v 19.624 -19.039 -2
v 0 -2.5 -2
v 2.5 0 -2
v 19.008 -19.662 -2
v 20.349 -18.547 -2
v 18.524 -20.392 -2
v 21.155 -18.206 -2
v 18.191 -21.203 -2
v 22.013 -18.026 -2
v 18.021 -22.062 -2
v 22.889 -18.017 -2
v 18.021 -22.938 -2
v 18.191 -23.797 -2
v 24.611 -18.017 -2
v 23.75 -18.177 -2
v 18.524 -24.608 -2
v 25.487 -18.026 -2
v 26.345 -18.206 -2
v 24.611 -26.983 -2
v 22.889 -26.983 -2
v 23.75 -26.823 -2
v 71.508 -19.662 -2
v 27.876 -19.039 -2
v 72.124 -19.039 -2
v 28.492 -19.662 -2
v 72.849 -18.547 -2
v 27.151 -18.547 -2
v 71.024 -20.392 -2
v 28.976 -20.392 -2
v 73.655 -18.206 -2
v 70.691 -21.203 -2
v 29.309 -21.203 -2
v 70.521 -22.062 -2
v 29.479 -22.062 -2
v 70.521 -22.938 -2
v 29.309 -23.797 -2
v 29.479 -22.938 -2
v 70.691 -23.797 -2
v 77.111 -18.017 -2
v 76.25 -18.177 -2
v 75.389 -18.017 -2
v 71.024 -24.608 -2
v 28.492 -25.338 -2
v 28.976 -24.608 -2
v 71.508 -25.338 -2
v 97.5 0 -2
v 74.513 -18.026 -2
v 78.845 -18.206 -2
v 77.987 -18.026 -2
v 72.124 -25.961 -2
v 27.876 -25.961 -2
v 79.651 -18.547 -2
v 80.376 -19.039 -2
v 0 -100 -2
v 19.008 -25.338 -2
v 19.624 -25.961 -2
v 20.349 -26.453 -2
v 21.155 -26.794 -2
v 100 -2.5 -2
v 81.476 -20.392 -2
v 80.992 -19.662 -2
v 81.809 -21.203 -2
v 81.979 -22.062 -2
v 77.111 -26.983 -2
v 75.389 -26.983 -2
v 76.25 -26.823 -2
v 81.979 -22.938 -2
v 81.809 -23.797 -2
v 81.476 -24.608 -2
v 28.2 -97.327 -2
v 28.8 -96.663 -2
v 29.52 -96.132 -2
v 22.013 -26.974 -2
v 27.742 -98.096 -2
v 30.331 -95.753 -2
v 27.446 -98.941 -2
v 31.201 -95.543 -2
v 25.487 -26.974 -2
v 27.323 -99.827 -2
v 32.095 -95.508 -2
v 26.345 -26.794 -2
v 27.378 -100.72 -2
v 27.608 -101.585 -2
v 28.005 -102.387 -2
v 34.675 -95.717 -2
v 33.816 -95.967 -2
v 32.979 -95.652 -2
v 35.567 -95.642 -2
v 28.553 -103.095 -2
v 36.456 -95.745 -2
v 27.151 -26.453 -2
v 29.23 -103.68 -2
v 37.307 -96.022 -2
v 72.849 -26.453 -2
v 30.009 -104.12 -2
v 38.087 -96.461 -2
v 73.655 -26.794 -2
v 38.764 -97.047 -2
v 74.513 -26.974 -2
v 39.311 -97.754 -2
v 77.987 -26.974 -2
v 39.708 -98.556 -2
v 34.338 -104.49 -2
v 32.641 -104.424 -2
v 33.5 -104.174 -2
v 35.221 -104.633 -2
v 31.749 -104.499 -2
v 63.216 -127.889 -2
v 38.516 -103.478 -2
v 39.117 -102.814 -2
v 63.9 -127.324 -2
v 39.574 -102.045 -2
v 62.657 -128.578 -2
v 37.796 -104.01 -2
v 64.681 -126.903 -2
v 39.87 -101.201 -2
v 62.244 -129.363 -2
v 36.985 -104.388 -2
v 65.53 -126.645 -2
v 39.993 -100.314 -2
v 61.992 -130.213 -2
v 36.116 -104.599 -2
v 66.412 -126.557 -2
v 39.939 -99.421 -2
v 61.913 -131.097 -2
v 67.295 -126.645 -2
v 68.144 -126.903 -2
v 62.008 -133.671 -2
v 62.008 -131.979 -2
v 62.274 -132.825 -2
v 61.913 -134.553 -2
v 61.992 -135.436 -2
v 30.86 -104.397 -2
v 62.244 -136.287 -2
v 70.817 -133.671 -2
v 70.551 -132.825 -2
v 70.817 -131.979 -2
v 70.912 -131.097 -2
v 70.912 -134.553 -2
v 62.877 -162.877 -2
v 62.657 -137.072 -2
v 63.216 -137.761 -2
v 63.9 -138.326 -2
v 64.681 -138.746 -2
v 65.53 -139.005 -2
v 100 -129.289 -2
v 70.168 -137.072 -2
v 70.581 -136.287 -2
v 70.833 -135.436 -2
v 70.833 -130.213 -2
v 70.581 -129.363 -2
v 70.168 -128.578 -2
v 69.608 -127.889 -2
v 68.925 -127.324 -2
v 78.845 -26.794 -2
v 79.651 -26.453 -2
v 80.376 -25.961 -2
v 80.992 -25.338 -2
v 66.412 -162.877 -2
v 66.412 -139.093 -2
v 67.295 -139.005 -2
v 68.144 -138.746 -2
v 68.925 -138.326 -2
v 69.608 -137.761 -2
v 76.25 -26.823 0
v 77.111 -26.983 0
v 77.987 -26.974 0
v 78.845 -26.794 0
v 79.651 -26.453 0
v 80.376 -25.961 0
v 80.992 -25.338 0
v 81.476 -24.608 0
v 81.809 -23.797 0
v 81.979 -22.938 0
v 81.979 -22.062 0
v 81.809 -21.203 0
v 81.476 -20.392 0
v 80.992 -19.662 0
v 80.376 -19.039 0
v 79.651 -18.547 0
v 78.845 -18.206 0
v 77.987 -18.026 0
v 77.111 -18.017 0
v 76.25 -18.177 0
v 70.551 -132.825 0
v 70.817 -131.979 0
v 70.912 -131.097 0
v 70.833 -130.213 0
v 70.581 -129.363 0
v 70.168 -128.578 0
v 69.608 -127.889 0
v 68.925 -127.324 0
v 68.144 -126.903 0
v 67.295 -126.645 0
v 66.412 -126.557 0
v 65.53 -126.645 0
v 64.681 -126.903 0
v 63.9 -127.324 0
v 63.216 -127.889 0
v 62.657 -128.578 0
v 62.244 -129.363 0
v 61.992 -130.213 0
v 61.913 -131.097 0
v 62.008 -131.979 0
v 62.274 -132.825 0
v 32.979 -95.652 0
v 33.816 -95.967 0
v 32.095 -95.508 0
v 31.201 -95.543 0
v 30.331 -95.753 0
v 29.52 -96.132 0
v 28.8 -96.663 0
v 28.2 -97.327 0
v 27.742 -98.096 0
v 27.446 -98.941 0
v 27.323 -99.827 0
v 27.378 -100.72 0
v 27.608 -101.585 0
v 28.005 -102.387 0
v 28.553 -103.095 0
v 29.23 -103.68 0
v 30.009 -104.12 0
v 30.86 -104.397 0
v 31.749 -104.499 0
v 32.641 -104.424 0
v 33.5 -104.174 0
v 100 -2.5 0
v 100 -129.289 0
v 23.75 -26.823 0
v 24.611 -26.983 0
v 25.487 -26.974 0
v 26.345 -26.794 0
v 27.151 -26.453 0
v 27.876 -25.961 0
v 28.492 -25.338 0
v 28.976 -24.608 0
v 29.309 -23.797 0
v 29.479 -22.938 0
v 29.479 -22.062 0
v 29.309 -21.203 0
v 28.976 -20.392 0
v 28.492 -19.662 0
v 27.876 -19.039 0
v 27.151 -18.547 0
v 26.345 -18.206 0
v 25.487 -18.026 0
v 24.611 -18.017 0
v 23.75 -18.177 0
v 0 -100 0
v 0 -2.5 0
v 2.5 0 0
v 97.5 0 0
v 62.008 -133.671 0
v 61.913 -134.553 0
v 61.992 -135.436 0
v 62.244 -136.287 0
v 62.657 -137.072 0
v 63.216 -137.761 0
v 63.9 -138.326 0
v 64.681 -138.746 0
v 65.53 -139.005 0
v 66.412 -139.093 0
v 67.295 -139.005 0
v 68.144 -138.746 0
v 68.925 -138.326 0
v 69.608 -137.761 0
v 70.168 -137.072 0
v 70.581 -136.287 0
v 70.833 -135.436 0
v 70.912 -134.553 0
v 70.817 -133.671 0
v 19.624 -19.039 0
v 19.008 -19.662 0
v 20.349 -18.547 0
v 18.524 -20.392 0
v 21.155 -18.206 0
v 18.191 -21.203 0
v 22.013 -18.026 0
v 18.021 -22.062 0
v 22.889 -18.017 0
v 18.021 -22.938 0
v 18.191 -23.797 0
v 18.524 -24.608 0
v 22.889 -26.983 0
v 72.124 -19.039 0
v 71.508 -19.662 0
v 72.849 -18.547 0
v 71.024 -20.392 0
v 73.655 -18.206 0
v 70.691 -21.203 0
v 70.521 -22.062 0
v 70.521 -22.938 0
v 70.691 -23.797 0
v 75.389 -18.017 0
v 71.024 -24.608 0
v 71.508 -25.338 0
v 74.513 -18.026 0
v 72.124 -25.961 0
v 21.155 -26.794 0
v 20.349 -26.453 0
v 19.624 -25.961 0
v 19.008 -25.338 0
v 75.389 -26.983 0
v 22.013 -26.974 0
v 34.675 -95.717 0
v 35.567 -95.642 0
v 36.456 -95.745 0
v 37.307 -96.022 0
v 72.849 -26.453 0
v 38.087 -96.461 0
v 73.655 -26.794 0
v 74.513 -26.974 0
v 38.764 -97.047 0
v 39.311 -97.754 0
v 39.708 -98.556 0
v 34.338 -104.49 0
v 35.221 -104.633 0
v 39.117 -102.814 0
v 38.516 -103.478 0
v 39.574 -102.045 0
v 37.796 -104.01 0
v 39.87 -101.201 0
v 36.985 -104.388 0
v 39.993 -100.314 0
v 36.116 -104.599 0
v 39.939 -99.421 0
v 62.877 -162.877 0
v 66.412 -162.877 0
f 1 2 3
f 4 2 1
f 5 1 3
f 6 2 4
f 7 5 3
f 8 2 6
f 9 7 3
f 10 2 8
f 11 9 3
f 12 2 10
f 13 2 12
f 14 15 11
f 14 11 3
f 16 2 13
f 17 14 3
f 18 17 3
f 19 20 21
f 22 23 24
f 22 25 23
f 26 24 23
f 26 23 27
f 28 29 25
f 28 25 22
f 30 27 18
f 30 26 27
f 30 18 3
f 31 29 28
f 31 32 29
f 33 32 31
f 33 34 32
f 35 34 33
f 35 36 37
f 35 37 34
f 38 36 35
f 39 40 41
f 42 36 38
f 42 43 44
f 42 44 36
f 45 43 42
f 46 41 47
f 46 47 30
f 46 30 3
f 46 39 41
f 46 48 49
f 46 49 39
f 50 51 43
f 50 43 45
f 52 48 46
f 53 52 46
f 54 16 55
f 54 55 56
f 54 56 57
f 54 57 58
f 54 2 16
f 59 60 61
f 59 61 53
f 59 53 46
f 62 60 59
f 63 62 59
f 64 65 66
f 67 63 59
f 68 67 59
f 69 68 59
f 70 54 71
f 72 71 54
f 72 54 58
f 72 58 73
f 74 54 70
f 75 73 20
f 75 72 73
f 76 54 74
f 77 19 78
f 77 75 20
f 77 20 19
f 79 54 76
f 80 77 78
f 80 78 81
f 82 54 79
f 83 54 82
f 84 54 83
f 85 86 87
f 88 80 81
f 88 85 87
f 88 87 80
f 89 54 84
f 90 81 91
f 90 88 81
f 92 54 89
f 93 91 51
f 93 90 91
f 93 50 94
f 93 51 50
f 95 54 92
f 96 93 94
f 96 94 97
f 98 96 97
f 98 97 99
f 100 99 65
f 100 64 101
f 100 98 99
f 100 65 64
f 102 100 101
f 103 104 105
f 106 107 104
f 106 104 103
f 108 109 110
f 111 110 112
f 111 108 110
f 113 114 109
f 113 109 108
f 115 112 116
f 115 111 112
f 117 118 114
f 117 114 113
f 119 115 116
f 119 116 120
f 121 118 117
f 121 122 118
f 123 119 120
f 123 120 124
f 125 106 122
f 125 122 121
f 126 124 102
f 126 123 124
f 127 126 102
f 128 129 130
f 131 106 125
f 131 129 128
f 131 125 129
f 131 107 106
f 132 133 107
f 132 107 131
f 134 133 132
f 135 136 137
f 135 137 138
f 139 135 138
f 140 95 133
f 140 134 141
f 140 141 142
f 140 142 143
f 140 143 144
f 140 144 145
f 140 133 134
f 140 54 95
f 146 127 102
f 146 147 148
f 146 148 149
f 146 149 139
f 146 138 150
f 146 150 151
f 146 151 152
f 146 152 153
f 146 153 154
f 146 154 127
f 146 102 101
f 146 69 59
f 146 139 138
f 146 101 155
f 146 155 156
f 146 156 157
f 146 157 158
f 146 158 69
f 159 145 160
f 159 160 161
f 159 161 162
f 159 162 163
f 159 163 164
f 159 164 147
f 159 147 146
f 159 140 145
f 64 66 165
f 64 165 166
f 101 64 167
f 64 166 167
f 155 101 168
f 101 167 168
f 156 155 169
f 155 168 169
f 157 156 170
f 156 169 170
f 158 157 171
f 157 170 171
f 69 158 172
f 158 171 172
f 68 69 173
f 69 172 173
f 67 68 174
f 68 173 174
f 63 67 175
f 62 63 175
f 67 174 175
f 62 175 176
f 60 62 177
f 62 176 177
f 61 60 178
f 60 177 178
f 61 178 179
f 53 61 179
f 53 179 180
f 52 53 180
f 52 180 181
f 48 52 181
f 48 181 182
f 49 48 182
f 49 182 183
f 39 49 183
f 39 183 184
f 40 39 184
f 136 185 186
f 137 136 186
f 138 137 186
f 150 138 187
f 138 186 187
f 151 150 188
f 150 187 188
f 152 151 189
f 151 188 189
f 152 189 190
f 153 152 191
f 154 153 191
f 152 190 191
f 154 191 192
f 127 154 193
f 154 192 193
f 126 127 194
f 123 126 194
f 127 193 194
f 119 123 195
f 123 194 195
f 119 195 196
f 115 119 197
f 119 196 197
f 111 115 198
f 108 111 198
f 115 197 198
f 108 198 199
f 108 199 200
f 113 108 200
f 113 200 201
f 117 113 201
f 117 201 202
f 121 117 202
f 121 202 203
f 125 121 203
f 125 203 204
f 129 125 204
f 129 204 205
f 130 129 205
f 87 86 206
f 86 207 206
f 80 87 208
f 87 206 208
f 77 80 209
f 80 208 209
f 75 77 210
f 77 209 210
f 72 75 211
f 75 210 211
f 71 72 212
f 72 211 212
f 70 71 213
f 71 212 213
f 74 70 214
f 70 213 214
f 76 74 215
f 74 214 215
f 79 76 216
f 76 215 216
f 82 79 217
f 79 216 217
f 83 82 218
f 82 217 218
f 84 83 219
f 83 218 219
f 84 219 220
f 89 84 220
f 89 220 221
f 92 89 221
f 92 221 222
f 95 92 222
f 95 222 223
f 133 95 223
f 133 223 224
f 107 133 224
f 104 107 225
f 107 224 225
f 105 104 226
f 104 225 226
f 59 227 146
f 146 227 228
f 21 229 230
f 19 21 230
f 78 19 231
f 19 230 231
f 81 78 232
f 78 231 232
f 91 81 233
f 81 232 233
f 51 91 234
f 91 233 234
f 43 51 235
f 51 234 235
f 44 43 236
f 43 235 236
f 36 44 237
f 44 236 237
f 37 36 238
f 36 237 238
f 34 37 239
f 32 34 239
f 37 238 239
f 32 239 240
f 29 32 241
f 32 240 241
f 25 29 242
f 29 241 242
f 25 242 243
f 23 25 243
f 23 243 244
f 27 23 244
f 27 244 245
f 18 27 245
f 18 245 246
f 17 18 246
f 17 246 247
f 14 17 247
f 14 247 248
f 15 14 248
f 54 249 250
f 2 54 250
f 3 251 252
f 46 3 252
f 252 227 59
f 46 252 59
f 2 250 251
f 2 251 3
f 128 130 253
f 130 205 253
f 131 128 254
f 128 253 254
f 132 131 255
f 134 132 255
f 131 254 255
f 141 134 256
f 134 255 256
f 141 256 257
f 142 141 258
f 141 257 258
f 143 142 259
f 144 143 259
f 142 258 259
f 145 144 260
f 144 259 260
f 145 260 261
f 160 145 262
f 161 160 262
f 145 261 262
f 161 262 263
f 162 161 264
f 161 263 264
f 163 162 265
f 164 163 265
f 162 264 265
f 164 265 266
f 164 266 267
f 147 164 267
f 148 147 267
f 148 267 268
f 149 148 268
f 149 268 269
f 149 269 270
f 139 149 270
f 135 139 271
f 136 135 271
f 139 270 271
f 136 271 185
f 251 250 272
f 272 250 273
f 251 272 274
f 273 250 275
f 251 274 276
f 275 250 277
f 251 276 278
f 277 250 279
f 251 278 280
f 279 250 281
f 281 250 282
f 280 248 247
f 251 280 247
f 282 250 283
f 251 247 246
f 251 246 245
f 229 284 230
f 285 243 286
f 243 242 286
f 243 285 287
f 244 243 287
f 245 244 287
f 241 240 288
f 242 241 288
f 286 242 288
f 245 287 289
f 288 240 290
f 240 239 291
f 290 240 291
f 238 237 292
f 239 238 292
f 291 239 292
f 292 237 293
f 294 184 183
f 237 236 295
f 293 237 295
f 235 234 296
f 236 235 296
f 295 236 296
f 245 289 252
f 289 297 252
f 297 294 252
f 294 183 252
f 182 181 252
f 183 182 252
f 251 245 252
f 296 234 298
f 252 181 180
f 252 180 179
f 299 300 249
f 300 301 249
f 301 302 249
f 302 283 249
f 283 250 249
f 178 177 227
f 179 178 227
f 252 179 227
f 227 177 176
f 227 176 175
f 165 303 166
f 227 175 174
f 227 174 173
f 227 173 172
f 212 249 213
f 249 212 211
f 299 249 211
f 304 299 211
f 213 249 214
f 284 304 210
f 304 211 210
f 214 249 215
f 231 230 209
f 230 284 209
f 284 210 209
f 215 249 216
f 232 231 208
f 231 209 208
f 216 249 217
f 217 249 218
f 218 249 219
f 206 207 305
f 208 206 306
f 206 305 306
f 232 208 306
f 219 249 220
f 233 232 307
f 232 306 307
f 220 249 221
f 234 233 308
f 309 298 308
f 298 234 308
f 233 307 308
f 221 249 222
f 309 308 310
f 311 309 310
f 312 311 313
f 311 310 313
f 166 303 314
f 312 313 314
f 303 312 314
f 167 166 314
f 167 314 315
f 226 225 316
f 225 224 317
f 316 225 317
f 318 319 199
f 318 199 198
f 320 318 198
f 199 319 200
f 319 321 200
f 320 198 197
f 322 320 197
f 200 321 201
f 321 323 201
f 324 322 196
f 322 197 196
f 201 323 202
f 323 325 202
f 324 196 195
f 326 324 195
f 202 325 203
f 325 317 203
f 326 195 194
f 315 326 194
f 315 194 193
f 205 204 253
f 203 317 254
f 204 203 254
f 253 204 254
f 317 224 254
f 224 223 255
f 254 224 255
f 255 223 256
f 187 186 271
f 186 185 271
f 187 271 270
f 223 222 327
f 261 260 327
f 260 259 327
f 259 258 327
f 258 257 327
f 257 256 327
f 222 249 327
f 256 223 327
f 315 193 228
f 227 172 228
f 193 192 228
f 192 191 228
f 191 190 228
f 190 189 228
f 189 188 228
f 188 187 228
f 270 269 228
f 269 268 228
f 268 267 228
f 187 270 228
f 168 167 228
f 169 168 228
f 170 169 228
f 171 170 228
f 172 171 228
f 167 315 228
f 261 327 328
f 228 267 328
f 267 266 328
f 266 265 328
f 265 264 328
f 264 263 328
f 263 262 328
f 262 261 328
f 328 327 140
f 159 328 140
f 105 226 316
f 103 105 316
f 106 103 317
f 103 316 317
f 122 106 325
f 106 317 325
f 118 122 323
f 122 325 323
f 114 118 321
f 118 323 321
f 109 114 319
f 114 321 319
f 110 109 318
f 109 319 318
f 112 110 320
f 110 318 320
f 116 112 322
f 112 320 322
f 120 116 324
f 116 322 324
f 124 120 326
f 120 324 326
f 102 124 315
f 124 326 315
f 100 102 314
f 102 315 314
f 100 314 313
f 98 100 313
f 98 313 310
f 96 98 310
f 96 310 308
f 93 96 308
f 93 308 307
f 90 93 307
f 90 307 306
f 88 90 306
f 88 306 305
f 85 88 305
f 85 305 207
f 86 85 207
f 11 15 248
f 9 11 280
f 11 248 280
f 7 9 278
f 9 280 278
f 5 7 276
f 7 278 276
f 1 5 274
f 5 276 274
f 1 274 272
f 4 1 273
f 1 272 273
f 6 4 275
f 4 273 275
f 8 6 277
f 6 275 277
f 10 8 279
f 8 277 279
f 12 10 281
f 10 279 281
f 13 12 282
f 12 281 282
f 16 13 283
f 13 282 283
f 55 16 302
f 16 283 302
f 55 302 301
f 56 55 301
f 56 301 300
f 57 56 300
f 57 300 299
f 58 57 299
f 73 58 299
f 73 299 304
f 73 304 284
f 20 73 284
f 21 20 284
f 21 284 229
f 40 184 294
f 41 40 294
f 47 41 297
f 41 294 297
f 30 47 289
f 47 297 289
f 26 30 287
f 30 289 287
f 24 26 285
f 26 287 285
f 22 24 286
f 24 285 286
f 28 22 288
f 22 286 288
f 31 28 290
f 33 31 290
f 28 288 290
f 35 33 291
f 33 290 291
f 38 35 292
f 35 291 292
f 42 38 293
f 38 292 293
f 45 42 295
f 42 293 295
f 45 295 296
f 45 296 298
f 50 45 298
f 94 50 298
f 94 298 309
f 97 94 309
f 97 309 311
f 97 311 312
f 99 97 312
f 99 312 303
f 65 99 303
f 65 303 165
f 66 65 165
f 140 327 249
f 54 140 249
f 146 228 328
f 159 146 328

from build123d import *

# Parameters (mm, degrees)
EXTRUDE_1_DEPTH   = 2
HOLE_WIZARD_M81_D = 9
CHAMFER_1_SIZE    = 2.5


with BuildPart() as part:
    # Эскиз3 → Бобышка-Вытянуть1 (new body)
    with BuildSketch(Plane(origin=(0, 0, 0), x_dir=(1, 0, 0), z_dir=(0, 0, -1))):
        Polygon((0, 0), (100, 0), (100, 129.289321881), (64.644660941, 164.644660941), (0, 100), align=None)
    extrude(amount=EXTRUDE_1_DEPTH)

    # Отверстие с зазором M81 (through all)
    with Locations(Plane(origin=(0, 0, -2), x_dir=(1, 0, 0), z_dir=(0, 0, -1))):
        with Locations((22.5, 22.5), (77.5, 22.5), (31.819805153, 100), (66.412427894, 134.59262274), (35.496760416, 100.141421356), (66.412427894, 131.057088834), (25, 22.5), (75, 22.5)):
            Hole(HOLE_WIZARD_M81_D / 2)

    # Фаска1
    chamfer_1_edges = [part.edges().sort_by_distance(p)[0] for p in [
        (64.644660941, -164.644660941, -1),
        (100, 0, -1),
        (0, 0, -1),
    ]]
    chamfer(chamfer_1_edges, length=CHAMFER_1_SIZE)


solid = part.part
